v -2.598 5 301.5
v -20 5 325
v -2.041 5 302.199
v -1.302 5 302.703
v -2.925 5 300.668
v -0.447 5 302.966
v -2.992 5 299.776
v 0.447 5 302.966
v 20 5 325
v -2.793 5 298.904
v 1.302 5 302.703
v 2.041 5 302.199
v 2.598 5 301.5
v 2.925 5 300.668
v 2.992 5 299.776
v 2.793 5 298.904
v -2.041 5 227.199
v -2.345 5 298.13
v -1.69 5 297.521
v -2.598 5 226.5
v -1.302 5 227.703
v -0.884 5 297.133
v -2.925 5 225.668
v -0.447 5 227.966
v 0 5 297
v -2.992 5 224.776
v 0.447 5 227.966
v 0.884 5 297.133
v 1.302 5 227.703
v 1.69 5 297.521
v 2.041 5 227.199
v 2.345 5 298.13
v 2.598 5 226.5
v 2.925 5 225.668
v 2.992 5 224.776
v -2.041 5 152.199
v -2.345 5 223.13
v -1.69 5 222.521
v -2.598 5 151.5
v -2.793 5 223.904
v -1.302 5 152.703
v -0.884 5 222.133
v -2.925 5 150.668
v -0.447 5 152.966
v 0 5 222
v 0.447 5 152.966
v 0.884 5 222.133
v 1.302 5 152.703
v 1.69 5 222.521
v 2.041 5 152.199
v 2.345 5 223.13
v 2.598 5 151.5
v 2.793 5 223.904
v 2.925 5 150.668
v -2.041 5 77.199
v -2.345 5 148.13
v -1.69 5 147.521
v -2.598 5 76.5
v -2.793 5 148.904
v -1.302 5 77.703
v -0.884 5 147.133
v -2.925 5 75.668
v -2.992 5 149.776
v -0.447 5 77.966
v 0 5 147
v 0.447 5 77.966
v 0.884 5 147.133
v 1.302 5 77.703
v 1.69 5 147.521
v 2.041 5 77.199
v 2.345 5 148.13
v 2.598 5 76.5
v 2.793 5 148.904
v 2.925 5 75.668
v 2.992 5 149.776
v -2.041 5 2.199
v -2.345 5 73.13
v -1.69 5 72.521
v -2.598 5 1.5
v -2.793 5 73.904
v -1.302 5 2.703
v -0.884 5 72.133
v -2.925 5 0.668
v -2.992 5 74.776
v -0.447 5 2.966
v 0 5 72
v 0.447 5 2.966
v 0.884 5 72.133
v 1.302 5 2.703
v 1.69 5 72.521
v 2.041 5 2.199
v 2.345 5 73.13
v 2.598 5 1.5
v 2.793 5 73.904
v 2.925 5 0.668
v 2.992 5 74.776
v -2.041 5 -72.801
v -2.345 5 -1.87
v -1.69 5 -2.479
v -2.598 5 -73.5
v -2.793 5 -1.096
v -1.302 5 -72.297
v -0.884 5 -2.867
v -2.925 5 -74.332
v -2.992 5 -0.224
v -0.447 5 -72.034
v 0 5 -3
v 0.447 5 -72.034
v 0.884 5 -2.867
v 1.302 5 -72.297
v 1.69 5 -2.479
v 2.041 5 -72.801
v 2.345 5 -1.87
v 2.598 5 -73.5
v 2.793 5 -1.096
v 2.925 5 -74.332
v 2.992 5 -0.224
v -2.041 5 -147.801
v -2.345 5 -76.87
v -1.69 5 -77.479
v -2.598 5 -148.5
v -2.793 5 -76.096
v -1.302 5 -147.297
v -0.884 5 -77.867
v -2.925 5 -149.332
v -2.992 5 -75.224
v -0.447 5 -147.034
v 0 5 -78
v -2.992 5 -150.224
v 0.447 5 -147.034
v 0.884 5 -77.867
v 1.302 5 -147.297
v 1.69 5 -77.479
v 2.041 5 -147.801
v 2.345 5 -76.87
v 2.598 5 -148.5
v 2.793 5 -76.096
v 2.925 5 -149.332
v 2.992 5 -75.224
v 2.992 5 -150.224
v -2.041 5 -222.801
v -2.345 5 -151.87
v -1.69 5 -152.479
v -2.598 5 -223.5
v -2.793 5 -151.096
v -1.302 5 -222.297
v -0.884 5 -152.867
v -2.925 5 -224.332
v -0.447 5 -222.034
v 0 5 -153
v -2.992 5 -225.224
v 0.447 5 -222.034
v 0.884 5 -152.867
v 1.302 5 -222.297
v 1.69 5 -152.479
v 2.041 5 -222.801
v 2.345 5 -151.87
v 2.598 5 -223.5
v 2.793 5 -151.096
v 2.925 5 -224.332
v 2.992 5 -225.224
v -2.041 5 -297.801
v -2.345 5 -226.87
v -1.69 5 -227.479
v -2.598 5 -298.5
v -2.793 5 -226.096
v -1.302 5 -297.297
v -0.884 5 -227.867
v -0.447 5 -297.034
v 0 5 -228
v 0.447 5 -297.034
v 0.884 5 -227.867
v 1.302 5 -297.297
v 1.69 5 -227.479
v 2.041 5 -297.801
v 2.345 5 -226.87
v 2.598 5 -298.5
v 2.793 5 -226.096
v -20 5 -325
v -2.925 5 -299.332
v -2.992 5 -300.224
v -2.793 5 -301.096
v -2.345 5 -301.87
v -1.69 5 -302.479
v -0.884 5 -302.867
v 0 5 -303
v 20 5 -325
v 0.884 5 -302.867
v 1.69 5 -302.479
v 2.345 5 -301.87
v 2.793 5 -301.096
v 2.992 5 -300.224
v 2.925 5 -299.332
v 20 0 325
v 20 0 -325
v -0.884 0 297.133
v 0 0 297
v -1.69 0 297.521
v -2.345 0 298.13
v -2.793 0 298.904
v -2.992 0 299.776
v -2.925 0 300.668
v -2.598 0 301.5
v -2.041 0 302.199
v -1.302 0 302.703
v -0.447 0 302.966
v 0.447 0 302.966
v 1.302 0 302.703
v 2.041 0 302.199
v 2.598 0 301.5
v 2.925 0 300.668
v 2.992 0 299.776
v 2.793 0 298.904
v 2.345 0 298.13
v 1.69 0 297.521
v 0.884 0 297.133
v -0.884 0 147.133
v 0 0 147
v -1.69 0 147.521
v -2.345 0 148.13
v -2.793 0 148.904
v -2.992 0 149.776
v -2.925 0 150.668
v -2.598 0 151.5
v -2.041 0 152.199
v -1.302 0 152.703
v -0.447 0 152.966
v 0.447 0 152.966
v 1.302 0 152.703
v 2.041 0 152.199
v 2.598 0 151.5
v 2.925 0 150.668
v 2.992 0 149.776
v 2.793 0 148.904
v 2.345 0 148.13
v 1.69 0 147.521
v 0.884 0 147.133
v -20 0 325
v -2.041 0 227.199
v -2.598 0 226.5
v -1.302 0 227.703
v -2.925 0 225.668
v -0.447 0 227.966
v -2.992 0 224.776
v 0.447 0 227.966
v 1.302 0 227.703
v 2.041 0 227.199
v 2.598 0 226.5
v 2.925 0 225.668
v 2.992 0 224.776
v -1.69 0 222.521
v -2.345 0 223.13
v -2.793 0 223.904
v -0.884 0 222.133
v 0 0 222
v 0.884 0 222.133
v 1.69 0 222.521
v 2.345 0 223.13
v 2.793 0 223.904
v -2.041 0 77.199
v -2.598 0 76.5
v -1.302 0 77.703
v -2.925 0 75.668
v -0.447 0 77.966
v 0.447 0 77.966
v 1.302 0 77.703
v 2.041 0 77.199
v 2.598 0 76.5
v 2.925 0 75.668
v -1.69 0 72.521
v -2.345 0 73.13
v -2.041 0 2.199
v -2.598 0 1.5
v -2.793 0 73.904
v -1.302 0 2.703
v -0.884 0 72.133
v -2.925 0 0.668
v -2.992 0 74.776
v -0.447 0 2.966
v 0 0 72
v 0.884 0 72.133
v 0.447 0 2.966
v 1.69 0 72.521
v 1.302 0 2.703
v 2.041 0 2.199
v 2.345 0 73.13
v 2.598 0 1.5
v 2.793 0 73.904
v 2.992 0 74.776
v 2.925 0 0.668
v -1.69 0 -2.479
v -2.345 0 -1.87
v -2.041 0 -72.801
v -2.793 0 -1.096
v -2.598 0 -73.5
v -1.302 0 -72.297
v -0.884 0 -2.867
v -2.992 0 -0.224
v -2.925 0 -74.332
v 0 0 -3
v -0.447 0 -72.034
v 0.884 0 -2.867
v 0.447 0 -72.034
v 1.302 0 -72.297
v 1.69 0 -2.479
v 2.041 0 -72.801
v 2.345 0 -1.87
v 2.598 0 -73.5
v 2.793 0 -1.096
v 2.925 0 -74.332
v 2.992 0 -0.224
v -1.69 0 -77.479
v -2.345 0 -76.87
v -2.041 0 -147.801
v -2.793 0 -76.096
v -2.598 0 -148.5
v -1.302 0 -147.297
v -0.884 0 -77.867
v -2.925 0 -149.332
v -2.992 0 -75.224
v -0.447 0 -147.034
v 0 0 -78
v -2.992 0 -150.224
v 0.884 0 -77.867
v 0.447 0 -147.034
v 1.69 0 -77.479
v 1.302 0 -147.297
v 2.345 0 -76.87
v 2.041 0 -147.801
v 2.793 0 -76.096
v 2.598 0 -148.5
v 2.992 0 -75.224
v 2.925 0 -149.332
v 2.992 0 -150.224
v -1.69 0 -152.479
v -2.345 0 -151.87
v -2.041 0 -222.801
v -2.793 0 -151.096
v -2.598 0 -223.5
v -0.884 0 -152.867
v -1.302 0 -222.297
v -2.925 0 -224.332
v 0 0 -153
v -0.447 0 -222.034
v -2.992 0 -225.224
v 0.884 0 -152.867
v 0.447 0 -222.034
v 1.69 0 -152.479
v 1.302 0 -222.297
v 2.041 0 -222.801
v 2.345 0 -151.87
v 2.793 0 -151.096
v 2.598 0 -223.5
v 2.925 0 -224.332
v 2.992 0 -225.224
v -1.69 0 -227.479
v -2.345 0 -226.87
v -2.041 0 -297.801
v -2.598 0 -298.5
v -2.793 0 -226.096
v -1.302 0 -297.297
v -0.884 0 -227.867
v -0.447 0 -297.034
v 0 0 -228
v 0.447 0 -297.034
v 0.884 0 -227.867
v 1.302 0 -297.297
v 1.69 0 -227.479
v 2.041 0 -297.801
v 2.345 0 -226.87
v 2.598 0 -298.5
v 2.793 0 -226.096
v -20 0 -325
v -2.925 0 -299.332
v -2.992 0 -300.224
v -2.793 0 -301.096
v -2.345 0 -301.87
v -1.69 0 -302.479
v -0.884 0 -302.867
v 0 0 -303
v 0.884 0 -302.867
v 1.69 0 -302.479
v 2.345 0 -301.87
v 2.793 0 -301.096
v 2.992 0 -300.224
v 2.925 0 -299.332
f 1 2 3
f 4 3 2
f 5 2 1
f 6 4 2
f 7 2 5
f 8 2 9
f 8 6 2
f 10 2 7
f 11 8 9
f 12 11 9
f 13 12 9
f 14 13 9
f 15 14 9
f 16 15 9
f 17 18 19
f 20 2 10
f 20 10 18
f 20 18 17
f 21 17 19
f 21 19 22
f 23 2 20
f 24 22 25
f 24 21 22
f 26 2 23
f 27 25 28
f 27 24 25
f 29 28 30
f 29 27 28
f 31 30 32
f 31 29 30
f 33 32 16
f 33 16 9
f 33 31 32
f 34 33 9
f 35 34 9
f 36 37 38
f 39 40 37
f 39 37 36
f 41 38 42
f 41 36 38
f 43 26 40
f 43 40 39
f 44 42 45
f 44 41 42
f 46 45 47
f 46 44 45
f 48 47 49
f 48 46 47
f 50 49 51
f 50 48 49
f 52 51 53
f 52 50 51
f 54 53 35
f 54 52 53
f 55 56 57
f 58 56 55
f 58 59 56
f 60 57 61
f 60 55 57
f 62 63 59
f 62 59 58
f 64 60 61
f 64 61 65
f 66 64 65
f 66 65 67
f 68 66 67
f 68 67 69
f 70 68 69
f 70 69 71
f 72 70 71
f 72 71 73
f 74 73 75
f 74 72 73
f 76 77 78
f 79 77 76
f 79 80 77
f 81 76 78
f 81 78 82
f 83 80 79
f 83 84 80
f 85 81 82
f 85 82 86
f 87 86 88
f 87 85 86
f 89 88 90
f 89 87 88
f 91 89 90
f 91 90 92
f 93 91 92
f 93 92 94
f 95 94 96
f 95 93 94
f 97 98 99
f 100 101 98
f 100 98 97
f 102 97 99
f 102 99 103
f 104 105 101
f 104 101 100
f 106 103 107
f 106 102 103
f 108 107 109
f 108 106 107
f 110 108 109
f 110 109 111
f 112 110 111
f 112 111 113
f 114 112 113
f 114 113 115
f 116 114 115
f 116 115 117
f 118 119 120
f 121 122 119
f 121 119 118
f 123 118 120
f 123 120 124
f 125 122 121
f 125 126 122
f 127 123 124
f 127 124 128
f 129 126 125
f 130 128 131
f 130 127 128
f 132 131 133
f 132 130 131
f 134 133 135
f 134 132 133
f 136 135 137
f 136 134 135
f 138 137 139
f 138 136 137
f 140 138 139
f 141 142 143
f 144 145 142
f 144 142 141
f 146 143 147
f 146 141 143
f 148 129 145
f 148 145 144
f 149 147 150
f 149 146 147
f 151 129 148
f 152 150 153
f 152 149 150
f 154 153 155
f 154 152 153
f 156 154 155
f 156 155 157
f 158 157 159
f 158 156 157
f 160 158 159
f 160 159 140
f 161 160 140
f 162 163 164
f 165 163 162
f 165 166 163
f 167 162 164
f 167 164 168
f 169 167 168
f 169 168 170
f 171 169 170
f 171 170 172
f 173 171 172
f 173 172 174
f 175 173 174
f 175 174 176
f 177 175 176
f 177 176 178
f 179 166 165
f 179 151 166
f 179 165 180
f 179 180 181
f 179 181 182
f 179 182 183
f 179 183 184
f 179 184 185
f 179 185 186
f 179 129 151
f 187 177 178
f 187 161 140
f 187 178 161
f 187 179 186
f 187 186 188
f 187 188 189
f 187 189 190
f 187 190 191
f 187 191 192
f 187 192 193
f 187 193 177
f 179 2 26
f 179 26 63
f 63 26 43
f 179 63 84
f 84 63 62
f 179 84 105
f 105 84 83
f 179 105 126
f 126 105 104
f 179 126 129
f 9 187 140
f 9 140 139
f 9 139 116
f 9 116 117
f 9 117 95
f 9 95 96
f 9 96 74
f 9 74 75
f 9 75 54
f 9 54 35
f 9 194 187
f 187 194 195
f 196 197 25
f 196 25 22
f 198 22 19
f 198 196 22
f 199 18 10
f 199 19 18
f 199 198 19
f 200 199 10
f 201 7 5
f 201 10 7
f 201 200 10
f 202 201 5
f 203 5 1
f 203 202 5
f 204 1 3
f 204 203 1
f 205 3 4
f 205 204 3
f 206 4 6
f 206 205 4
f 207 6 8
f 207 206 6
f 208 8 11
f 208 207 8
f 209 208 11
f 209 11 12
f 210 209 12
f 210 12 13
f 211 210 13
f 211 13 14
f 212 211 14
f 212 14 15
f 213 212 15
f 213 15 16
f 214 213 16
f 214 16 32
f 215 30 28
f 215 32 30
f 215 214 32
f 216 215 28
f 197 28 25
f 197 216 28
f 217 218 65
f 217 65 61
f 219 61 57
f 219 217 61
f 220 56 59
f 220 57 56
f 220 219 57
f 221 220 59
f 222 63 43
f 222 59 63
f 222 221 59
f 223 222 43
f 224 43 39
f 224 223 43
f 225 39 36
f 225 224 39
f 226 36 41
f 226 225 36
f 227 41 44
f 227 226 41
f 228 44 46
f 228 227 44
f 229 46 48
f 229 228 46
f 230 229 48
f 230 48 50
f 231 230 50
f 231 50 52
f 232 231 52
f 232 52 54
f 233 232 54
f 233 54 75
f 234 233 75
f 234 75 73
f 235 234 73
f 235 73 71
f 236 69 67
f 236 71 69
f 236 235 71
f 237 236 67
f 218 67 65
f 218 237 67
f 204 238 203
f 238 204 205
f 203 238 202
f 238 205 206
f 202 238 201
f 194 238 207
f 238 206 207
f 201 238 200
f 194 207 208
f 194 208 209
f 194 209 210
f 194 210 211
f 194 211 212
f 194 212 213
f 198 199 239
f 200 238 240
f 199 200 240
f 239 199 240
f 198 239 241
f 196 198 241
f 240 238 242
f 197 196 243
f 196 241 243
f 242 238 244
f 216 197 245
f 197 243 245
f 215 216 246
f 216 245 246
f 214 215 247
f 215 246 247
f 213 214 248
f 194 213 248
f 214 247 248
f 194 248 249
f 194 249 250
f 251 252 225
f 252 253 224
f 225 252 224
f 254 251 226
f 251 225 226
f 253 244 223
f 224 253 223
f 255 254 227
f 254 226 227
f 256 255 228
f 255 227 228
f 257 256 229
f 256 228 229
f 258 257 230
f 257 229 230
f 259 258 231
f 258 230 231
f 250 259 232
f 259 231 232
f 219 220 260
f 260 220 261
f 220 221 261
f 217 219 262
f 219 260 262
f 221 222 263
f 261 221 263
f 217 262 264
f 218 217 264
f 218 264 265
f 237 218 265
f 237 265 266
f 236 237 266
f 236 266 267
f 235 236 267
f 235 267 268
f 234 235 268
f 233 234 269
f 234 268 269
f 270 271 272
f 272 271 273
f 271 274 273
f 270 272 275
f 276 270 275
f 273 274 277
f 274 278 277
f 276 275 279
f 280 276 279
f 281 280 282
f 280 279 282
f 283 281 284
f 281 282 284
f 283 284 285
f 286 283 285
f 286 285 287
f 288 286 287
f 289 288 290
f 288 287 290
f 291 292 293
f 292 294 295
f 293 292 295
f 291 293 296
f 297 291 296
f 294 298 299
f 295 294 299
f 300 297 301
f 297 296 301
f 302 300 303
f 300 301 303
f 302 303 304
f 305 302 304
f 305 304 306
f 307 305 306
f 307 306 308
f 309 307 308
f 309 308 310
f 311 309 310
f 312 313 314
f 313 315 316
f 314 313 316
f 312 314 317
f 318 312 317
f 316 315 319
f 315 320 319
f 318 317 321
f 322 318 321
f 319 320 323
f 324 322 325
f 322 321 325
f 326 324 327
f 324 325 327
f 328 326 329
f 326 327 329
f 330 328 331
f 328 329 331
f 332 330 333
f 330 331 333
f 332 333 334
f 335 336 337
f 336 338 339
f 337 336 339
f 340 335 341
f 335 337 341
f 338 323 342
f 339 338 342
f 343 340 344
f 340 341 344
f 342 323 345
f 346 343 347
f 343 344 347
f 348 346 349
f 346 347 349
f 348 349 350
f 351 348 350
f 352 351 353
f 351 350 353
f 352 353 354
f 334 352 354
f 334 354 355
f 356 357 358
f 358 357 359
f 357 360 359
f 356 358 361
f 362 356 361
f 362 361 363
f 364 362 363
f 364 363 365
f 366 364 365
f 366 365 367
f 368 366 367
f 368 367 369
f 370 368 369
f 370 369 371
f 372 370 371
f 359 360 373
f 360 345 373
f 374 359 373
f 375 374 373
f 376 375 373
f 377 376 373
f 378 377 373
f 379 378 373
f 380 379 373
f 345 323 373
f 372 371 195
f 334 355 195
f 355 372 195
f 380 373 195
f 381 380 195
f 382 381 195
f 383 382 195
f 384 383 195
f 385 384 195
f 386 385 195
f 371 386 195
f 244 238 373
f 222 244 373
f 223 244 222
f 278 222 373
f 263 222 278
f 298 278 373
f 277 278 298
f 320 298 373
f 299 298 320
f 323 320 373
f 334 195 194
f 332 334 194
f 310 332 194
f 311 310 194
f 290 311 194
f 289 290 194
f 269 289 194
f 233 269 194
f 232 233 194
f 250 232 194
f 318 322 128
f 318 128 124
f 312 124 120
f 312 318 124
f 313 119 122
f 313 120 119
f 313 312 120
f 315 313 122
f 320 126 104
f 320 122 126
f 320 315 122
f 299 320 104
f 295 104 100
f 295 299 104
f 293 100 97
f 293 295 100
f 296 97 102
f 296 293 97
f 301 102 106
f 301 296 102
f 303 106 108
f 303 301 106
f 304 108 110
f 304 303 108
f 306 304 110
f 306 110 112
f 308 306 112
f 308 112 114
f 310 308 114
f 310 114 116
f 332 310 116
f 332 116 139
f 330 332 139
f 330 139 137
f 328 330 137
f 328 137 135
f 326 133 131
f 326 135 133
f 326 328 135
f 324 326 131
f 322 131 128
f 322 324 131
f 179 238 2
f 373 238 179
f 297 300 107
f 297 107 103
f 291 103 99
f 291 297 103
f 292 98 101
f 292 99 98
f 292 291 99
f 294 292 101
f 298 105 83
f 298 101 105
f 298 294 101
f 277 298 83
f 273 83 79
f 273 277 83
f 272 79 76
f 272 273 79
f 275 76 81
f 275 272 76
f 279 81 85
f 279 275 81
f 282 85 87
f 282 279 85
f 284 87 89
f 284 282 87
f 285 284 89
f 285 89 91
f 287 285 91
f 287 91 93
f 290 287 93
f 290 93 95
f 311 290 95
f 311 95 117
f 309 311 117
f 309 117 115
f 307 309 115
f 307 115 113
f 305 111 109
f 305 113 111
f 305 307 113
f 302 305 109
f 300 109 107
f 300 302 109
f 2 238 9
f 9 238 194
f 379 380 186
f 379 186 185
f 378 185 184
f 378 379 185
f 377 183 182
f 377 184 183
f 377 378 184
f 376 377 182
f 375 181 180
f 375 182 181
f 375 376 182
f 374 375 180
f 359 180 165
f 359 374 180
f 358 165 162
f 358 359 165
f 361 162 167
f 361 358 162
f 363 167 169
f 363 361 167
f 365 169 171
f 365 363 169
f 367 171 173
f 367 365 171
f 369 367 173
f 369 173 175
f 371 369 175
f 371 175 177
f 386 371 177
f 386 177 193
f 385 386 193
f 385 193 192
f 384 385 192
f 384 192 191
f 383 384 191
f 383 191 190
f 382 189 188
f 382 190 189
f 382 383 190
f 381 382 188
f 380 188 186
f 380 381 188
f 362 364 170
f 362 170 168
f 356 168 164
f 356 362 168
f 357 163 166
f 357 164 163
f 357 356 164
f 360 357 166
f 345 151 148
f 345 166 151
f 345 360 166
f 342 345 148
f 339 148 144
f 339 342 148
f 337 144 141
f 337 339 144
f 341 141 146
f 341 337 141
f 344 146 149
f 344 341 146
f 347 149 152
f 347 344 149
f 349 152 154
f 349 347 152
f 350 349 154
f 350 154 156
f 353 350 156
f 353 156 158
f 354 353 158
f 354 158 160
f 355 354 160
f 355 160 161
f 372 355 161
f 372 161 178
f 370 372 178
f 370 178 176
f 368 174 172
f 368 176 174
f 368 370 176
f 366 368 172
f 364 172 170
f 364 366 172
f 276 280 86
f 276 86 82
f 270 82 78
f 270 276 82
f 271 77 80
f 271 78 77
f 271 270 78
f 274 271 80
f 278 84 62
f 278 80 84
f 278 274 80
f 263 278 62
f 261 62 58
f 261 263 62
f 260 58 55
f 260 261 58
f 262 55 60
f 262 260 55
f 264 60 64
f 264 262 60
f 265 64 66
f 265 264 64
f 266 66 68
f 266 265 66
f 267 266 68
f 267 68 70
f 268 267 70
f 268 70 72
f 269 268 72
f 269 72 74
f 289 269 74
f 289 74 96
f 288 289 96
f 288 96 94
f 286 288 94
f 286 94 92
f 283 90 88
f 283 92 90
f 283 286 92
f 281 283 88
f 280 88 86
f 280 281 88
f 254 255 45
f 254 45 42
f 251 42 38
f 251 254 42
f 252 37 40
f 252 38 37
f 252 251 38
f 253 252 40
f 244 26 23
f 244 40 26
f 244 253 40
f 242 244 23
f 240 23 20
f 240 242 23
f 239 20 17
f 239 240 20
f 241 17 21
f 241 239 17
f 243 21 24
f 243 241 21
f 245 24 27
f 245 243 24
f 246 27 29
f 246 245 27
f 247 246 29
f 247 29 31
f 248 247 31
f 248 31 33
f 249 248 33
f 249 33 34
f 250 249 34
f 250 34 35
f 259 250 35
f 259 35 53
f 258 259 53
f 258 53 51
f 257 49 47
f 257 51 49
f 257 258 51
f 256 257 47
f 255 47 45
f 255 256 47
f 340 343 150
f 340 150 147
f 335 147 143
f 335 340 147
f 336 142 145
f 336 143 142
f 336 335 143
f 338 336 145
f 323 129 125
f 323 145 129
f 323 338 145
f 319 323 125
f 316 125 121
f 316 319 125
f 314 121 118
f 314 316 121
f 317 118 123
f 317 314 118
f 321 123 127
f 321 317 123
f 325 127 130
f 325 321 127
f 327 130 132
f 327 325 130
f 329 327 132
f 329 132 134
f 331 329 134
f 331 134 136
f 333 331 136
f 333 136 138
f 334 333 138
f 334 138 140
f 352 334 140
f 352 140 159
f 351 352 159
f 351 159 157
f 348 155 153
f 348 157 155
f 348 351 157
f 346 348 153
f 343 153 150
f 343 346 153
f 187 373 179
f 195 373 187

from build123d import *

# Parameters (mm, degrees)
SKETCH1_W               = 40
SKETCH1_H               = 650
BOSS_EXTRUDE1_DEPTH     = 5
CUT_EXTRUDE1_DEPTH      = 326.653189759
CUT_EXTRUDE1_DEPTH_BACK = 326.653189759
SKETCH2_R               = 3


with BuildPart() as part:
    # Sketch1 → Boss-Extrude1 (new body)
    with BuildSketch(Plane(origin=(0, 0, 0), x_dir=(1, 0, 0), z_dir=(0, 1, 0))):
        Rectangle(SKETCH1_W, SKETCH1_H)
    extrude(amount=BOSS_EXTRUDE1_DEPTH)

    # Sketch2 → Cut-Extrude1 (cut, two sides: drawn at the far end of the back side and taken through both)
    with BuildSketch(Plane(origin=(0, 0, 0), x_dir=(1, 0, 0), z_dir=(0, 1, 0)).offset(-CUT_EXTRUDE1_DEPTH_BACK)):
        with Locations(Location((0, 0, 0), (0, 0, 90))):
            Circle(SKETCH2_R)
        with Locations(Location((0, 75, 0), (0, 0, 90))):
            Circle(SKETCH2_R)
        with Locations(Location((0, 150, 0), (0, 0, 90))):
            Circle(SKETCH2_R)
        with Locations(Location((0, 225, 0), (0, 0, 90))):
            Circle(SKETCH2_R)
        with Locations(Location((0, 300, 0), (0, 0, 90))):
            Circle(SKETCH2_R)
        with Locations(Location((0, -300, 0), (0, 0, 90))):
            Circle(SKETCH2_R)
        with Locations(Location((0, -225, 0), (0, 0, 90))):
            Circle(SKETCH2_R)
        with Locations(Location((0, -150, 0), (0, 0, 90))):
            Circle(SKETCH2_R)
        with Locations(Location((0, -75, 0), (0, 0, 90))):
            Circle(SKETCH2_R)
    extrude(amount=CUT_EXTRUDE1_DEPTH + CUT_EXTRUDE1_DEPTH_BACK, mode=Mode.SUBTRACT)


solid = part.part
